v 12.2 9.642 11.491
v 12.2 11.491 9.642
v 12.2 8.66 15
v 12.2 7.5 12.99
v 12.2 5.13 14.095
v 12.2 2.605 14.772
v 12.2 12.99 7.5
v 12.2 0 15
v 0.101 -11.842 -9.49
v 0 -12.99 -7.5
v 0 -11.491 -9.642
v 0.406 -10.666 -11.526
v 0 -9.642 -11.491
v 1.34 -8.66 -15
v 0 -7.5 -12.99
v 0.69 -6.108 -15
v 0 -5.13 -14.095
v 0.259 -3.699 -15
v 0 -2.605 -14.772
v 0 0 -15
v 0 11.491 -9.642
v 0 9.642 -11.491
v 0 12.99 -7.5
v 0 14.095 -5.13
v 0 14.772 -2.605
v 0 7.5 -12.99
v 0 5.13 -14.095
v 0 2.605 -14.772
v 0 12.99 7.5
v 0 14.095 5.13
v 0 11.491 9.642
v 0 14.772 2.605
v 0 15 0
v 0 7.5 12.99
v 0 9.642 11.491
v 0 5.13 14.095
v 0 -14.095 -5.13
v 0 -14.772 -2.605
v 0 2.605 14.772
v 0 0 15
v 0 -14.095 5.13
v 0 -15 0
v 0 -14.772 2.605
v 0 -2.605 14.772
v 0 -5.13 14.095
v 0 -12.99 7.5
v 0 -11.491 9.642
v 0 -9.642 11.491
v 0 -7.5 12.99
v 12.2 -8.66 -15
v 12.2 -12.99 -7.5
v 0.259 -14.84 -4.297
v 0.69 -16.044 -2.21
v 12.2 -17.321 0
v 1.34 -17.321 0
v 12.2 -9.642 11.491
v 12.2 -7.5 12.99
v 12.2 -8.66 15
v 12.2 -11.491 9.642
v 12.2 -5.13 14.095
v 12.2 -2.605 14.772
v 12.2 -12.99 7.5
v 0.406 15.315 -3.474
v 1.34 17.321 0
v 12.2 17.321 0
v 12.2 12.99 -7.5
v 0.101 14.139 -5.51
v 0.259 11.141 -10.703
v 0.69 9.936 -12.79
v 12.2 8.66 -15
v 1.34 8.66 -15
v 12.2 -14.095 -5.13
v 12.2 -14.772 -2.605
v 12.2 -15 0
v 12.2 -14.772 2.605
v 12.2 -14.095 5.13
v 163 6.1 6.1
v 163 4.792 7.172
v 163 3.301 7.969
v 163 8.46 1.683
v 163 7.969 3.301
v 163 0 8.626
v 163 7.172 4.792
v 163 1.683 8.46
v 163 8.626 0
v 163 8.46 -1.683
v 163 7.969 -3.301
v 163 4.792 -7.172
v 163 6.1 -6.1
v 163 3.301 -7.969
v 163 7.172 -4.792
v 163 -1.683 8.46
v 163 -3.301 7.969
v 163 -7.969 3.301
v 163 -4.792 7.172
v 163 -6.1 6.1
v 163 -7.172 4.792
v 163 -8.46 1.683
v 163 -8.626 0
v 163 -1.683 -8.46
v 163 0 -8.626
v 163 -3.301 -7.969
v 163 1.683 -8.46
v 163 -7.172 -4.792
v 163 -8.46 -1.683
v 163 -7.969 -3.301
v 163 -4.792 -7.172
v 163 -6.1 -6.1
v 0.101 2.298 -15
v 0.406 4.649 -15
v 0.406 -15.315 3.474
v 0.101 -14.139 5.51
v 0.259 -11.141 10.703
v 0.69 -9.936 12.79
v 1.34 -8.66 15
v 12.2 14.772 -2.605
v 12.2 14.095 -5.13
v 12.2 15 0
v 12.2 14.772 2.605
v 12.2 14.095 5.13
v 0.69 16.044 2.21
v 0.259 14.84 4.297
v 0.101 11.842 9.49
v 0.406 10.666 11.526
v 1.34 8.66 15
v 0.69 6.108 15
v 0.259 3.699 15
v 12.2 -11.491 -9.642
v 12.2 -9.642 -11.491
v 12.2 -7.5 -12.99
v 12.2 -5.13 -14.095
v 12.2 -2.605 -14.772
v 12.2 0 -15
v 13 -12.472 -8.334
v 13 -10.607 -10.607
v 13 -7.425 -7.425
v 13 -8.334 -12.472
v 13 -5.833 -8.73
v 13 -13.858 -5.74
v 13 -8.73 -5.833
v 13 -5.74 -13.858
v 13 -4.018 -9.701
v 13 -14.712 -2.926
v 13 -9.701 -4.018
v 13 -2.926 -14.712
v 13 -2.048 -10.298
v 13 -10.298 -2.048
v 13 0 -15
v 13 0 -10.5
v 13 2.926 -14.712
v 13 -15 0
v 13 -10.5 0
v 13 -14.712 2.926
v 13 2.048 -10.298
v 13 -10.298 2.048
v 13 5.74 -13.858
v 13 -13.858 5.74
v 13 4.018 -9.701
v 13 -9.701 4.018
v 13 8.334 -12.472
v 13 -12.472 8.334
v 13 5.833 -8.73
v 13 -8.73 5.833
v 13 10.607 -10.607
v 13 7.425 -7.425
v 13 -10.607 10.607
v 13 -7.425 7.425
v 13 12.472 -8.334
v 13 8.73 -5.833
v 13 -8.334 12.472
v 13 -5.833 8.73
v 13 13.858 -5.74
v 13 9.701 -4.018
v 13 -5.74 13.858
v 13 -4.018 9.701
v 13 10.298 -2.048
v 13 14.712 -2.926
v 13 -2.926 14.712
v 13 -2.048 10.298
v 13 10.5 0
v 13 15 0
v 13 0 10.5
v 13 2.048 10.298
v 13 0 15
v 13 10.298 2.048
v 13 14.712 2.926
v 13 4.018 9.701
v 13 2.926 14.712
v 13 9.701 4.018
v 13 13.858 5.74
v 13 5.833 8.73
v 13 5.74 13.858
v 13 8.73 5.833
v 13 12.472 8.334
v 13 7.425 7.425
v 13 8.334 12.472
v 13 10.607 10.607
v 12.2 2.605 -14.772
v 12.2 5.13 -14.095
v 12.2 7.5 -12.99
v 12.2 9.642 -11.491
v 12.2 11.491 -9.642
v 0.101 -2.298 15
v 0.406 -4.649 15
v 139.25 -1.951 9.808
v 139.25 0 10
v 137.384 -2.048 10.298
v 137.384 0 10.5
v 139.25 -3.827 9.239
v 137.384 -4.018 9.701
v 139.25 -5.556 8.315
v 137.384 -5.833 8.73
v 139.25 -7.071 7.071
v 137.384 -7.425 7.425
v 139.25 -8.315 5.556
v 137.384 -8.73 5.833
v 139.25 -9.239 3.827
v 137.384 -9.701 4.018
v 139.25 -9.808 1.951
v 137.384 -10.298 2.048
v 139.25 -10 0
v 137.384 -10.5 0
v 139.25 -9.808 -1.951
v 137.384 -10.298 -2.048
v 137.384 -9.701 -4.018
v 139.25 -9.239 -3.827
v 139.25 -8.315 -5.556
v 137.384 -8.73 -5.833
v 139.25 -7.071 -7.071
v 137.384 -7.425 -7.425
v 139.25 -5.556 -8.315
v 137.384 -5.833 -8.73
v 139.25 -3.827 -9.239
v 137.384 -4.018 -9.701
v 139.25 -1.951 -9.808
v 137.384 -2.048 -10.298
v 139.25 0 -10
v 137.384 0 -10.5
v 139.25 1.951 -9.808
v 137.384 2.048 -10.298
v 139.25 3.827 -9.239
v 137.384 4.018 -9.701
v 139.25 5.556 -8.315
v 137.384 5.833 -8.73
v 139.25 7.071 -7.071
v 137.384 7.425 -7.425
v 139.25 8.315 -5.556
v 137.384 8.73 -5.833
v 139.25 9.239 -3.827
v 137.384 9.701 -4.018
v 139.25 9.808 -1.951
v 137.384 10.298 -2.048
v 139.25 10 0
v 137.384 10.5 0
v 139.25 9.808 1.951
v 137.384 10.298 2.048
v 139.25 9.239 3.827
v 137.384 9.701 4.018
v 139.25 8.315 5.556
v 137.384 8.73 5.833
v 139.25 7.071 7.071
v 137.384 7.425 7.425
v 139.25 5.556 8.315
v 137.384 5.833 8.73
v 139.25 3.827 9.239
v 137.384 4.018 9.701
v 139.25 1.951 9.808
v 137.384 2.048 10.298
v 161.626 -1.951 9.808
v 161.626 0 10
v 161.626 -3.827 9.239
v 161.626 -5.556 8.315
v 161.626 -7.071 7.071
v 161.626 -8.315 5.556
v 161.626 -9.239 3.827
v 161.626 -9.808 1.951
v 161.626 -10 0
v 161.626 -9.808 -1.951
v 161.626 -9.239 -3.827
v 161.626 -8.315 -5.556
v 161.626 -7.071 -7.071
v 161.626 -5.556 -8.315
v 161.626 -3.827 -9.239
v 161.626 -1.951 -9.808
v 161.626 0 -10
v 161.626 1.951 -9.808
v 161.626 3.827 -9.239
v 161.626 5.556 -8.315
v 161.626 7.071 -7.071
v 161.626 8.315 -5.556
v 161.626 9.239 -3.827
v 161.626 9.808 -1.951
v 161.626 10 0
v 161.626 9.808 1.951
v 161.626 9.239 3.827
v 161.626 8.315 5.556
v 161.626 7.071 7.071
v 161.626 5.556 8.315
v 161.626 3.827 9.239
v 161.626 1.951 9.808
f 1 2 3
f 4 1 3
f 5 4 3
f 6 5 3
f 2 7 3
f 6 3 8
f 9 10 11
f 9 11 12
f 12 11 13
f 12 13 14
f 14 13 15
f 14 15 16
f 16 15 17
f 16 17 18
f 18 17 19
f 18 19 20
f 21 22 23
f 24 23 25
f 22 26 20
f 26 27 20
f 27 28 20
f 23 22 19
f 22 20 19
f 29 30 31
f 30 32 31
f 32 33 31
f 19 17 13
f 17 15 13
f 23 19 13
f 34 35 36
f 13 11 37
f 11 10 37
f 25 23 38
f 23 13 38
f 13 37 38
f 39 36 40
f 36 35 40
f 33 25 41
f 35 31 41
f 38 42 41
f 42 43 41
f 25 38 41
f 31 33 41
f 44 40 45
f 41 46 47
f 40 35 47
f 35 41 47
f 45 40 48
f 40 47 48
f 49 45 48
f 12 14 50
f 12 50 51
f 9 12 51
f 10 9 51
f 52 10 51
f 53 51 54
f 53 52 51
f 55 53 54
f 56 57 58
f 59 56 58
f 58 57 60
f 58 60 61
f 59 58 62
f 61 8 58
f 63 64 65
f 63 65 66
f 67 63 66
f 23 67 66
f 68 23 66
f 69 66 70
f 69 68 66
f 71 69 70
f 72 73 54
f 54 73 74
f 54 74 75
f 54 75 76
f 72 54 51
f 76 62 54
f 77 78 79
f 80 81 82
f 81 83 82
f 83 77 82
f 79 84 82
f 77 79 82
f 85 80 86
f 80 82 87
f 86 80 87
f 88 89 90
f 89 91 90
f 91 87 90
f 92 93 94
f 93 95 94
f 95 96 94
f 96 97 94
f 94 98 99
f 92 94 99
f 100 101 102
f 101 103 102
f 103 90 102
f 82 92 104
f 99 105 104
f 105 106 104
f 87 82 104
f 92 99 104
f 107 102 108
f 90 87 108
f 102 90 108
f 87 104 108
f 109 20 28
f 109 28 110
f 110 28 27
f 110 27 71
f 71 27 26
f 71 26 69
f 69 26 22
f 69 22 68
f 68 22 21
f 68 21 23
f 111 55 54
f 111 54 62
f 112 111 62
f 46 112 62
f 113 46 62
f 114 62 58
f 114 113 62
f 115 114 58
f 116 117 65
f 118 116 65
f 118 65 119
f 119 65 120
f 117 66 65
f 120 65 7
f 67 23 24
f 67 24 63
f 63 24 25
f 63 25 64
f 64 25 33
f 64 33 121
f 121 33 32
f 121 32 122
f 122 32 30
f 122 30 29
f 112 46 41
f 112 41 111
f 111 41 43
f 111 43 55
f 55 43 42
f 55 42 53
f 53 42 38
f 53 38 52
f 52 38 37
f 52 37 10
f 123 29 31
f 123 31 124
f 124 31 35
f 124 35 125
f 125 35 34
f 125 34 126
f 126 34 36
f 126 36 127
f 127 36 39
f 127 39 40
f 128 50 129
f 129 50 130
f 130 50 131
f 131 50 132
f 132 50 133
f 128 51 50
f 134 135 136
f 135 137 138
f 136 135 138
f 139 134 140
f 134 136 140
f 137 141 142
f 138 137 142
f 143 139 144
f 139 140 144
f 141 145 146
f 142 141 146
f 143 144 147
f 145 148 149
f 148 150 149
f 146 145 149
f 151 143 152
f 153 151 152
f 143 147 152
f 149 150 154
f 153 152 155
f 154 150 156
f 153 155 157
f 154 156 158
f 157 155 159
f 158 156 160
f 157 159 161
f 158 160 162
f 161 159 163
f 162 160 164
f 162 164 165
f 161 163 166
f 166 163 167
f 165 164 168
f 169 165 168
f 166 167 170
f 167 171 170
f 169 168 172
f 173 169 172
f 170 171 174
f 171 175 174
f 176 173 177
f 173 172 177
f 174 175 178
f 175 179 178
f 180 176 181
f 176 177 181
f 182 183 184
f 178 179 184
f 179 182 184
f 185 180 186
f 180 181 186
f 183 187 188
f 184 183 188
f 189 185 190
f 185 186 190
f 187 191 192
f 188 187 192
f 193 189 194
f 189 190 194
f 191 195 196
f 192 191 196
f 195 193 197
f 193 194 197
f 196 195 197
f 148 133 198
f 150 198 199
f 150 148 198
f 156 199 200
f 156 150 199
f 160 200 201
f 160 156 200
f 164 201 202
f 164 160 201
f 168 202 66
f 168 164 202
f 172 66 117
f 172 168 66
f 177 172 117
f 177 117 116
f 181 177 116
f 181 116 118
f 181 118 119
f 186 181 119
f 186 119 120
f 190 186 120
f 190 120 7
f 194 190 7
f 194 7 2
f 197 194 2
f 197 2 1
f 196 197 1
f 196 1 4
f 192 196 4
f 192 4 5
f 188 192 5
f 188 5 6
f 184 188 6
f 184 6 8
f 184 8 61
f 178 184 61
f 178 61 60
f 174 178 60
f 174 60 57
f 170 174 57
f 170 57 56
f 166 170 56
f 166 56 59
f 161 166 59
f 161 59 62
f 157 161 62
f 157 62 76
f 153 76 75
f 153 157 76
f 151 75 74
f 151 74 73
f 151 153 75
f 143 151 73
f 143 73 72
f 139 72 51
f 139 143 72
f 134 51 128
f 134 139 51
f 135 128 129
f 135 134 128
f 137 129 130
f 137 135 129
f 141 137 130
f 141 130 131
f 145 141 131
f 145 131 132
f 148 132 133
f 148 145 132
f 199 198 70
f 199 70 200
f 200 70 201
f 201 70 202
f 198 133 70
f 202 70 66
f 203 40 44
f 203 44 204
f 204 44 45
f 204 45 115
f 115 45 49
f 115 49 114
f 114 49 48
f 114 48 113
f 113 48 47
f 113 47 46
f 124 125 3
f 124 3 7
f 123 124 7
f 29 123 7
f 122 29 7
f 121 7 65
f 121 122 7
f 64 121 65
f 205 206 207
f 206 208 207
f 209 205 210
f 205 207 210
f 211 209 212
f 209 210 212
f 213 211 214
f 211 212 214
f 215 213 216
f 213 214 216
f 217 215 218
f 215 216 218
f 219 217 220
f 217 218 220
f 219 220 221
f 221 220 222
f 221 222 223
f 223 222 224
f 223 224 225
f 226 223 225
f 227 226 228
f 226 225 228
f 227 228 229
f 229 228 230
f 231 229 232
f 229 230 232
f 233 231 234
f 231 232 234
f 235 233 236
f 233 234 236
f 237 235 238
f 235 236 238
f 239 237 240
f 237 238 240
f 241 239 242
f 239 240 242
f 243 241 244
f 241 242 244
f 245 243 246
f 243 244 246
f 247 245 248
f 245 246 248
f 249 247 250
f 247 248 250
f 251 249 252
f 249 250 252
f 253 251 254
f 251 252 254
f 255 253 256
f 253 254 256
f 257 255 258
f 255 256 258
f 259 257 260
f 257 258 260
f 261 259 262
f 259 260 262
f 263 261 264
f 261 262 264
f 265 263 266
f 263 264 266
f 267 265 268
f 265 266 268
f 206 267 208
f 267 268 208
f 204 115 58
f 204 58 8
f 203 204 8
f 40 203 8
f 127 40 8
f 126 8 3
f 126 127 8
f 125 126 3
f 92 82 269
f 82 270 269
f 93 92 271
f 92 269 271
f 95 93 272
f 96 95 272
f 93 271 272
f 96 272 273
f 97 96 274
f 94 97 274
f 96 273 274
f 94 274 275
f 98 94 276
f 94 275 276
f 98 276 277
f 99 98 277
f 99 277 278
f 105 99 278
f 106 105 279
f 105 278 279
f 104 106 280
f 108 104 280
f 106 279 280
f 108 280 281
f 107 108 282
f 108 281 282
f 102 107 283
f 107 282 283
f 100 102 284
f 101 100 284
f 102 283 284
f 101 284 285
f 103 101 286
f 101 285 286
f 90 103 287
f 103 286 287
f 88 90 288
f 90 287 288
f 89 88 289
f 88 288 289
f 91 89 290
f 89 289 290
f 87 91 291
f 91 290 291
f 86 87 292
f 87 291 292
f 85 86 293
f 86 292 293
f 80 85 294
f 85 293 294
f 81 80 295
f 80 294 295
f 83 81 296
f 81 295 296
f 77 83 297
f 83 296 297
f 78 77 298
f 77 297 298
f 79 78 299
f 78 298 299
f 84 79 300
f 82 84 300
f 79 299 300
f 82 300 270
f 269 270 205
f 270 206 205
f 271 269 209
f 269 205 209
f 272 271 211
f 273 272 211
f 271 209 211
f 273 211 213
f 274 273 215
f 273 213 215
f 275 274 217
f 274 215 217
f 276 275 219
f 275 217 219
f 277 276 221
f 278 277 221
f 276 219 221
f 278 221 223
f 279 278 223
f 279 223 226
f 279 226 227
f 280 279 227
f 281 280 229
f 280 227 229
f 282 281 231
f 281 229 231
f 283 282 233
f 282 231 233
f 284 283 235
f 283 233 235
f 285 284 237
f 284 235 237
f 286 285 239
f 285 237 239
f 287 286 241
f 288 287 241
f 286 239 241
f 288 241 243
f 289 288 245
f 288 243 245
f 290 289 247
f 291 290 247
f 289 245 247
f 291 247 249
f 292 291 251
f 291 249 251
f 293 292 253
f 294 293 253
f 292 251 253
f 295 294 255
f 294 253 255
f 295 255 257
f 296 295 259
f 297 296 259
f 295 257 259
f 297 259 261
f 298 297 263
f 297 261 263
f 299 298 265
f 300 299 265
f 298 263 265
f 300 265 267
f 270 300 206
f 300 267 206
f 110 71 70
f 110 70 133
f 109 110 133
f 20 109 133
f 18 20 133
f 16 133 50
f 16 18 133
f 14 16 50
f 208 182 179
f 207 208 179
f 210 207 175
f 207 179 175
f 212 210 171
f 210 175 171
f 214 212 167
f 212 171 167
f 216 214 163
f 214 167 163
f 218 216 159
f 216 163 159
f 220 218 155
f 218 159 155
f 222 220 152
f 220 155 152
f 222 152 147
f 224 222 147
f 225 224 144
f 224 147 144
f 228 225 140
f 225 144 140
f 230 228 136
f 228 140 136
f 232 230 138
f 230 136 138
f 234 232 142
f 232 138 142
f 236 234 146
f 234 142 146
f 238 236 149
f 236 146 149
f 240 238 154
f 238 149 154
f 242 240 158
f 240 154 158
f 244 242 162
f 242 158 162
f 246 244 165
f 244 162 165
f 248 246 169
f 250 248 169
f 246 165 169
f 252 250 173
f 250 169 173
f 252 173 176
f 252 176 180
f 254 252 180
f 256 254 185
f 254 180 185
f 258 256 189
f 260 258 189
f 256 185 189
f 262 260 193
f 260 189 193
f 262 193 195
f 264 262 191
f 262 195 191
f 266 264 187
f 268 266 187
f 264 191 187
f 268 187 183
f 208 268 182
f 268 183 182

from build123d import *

# Parameters (mm, degrees)
BASEHEAD_DEPTH = 13
BEARINGSKE_W   = 0.8
BEARINGSKE_H   = 2.320508076


with BuildPart() as part:
    # HeadSke → BaseHead (new body)
    with BuildSketch(Plane(origin=(0, 0, 0), x_dir=(0, 0, -1), z_dir=(1, 0, 0))):
        Polygon((15, 8.660254038), (15, -8.660254038), (0, -17.320508076), (-15, -8.660254038), (-15, 8.660254038), (0, 17.320508076), align=None)
    extrude(amount=BASEHEAD_DEPTH)

    # BodySke → BaseBody (revolve)
    with BuildSketch(Plane.XY, mode=Mode.PRIVATE) as basebody_sk:
        Polygon((0, 10.5), (0, 0), (163, 0), (163, 8.626), (161.626, 10), (139.25, 10), (137.383974596, 10.5), align=None)
    revolve(basebody_sk.sketch.rotate(Axis((0, 0, 0), (1, 0, 0)), 90), axis=Axis((0, 0, 0), (1, 0, 0)))

    # Sketch3 → HeadChamfer (revolve, cut)
    with BuildSketch(Plane(origin=(0, 0, 0), x_dir=(1, 0, 0), z_dir=(0, 1, 0))):
        Polygon((3.75, 21.495190528), (-3.75, 8.504809472), (-13.695781038, 14.247008831), (-6.195781038, 27.237389888), align=None)
    revolve(axis=Axis((0, 0, 0), (1, 0, 0)), mode=Mode.SUBTRACT)

    # BearingSke → BearingFace (revolve, cut)
    with BuildSketch(Plane.XY, mode=Mode.PRIVATE) as bearingface_sk:
        with Locations((12.6, 16.160254038)):
            Rectangle(BEARINGSKE_W, BEARINGSKE_H)
    revolve(bearingface_sk.sketch.rotate(Axis((0, 0, 0), (1, 0, 0)), 270), axis=Axis((0, 0, 0), (1, 0, 0)), mode=Mode.SUBTRACT)


solid = part.part
